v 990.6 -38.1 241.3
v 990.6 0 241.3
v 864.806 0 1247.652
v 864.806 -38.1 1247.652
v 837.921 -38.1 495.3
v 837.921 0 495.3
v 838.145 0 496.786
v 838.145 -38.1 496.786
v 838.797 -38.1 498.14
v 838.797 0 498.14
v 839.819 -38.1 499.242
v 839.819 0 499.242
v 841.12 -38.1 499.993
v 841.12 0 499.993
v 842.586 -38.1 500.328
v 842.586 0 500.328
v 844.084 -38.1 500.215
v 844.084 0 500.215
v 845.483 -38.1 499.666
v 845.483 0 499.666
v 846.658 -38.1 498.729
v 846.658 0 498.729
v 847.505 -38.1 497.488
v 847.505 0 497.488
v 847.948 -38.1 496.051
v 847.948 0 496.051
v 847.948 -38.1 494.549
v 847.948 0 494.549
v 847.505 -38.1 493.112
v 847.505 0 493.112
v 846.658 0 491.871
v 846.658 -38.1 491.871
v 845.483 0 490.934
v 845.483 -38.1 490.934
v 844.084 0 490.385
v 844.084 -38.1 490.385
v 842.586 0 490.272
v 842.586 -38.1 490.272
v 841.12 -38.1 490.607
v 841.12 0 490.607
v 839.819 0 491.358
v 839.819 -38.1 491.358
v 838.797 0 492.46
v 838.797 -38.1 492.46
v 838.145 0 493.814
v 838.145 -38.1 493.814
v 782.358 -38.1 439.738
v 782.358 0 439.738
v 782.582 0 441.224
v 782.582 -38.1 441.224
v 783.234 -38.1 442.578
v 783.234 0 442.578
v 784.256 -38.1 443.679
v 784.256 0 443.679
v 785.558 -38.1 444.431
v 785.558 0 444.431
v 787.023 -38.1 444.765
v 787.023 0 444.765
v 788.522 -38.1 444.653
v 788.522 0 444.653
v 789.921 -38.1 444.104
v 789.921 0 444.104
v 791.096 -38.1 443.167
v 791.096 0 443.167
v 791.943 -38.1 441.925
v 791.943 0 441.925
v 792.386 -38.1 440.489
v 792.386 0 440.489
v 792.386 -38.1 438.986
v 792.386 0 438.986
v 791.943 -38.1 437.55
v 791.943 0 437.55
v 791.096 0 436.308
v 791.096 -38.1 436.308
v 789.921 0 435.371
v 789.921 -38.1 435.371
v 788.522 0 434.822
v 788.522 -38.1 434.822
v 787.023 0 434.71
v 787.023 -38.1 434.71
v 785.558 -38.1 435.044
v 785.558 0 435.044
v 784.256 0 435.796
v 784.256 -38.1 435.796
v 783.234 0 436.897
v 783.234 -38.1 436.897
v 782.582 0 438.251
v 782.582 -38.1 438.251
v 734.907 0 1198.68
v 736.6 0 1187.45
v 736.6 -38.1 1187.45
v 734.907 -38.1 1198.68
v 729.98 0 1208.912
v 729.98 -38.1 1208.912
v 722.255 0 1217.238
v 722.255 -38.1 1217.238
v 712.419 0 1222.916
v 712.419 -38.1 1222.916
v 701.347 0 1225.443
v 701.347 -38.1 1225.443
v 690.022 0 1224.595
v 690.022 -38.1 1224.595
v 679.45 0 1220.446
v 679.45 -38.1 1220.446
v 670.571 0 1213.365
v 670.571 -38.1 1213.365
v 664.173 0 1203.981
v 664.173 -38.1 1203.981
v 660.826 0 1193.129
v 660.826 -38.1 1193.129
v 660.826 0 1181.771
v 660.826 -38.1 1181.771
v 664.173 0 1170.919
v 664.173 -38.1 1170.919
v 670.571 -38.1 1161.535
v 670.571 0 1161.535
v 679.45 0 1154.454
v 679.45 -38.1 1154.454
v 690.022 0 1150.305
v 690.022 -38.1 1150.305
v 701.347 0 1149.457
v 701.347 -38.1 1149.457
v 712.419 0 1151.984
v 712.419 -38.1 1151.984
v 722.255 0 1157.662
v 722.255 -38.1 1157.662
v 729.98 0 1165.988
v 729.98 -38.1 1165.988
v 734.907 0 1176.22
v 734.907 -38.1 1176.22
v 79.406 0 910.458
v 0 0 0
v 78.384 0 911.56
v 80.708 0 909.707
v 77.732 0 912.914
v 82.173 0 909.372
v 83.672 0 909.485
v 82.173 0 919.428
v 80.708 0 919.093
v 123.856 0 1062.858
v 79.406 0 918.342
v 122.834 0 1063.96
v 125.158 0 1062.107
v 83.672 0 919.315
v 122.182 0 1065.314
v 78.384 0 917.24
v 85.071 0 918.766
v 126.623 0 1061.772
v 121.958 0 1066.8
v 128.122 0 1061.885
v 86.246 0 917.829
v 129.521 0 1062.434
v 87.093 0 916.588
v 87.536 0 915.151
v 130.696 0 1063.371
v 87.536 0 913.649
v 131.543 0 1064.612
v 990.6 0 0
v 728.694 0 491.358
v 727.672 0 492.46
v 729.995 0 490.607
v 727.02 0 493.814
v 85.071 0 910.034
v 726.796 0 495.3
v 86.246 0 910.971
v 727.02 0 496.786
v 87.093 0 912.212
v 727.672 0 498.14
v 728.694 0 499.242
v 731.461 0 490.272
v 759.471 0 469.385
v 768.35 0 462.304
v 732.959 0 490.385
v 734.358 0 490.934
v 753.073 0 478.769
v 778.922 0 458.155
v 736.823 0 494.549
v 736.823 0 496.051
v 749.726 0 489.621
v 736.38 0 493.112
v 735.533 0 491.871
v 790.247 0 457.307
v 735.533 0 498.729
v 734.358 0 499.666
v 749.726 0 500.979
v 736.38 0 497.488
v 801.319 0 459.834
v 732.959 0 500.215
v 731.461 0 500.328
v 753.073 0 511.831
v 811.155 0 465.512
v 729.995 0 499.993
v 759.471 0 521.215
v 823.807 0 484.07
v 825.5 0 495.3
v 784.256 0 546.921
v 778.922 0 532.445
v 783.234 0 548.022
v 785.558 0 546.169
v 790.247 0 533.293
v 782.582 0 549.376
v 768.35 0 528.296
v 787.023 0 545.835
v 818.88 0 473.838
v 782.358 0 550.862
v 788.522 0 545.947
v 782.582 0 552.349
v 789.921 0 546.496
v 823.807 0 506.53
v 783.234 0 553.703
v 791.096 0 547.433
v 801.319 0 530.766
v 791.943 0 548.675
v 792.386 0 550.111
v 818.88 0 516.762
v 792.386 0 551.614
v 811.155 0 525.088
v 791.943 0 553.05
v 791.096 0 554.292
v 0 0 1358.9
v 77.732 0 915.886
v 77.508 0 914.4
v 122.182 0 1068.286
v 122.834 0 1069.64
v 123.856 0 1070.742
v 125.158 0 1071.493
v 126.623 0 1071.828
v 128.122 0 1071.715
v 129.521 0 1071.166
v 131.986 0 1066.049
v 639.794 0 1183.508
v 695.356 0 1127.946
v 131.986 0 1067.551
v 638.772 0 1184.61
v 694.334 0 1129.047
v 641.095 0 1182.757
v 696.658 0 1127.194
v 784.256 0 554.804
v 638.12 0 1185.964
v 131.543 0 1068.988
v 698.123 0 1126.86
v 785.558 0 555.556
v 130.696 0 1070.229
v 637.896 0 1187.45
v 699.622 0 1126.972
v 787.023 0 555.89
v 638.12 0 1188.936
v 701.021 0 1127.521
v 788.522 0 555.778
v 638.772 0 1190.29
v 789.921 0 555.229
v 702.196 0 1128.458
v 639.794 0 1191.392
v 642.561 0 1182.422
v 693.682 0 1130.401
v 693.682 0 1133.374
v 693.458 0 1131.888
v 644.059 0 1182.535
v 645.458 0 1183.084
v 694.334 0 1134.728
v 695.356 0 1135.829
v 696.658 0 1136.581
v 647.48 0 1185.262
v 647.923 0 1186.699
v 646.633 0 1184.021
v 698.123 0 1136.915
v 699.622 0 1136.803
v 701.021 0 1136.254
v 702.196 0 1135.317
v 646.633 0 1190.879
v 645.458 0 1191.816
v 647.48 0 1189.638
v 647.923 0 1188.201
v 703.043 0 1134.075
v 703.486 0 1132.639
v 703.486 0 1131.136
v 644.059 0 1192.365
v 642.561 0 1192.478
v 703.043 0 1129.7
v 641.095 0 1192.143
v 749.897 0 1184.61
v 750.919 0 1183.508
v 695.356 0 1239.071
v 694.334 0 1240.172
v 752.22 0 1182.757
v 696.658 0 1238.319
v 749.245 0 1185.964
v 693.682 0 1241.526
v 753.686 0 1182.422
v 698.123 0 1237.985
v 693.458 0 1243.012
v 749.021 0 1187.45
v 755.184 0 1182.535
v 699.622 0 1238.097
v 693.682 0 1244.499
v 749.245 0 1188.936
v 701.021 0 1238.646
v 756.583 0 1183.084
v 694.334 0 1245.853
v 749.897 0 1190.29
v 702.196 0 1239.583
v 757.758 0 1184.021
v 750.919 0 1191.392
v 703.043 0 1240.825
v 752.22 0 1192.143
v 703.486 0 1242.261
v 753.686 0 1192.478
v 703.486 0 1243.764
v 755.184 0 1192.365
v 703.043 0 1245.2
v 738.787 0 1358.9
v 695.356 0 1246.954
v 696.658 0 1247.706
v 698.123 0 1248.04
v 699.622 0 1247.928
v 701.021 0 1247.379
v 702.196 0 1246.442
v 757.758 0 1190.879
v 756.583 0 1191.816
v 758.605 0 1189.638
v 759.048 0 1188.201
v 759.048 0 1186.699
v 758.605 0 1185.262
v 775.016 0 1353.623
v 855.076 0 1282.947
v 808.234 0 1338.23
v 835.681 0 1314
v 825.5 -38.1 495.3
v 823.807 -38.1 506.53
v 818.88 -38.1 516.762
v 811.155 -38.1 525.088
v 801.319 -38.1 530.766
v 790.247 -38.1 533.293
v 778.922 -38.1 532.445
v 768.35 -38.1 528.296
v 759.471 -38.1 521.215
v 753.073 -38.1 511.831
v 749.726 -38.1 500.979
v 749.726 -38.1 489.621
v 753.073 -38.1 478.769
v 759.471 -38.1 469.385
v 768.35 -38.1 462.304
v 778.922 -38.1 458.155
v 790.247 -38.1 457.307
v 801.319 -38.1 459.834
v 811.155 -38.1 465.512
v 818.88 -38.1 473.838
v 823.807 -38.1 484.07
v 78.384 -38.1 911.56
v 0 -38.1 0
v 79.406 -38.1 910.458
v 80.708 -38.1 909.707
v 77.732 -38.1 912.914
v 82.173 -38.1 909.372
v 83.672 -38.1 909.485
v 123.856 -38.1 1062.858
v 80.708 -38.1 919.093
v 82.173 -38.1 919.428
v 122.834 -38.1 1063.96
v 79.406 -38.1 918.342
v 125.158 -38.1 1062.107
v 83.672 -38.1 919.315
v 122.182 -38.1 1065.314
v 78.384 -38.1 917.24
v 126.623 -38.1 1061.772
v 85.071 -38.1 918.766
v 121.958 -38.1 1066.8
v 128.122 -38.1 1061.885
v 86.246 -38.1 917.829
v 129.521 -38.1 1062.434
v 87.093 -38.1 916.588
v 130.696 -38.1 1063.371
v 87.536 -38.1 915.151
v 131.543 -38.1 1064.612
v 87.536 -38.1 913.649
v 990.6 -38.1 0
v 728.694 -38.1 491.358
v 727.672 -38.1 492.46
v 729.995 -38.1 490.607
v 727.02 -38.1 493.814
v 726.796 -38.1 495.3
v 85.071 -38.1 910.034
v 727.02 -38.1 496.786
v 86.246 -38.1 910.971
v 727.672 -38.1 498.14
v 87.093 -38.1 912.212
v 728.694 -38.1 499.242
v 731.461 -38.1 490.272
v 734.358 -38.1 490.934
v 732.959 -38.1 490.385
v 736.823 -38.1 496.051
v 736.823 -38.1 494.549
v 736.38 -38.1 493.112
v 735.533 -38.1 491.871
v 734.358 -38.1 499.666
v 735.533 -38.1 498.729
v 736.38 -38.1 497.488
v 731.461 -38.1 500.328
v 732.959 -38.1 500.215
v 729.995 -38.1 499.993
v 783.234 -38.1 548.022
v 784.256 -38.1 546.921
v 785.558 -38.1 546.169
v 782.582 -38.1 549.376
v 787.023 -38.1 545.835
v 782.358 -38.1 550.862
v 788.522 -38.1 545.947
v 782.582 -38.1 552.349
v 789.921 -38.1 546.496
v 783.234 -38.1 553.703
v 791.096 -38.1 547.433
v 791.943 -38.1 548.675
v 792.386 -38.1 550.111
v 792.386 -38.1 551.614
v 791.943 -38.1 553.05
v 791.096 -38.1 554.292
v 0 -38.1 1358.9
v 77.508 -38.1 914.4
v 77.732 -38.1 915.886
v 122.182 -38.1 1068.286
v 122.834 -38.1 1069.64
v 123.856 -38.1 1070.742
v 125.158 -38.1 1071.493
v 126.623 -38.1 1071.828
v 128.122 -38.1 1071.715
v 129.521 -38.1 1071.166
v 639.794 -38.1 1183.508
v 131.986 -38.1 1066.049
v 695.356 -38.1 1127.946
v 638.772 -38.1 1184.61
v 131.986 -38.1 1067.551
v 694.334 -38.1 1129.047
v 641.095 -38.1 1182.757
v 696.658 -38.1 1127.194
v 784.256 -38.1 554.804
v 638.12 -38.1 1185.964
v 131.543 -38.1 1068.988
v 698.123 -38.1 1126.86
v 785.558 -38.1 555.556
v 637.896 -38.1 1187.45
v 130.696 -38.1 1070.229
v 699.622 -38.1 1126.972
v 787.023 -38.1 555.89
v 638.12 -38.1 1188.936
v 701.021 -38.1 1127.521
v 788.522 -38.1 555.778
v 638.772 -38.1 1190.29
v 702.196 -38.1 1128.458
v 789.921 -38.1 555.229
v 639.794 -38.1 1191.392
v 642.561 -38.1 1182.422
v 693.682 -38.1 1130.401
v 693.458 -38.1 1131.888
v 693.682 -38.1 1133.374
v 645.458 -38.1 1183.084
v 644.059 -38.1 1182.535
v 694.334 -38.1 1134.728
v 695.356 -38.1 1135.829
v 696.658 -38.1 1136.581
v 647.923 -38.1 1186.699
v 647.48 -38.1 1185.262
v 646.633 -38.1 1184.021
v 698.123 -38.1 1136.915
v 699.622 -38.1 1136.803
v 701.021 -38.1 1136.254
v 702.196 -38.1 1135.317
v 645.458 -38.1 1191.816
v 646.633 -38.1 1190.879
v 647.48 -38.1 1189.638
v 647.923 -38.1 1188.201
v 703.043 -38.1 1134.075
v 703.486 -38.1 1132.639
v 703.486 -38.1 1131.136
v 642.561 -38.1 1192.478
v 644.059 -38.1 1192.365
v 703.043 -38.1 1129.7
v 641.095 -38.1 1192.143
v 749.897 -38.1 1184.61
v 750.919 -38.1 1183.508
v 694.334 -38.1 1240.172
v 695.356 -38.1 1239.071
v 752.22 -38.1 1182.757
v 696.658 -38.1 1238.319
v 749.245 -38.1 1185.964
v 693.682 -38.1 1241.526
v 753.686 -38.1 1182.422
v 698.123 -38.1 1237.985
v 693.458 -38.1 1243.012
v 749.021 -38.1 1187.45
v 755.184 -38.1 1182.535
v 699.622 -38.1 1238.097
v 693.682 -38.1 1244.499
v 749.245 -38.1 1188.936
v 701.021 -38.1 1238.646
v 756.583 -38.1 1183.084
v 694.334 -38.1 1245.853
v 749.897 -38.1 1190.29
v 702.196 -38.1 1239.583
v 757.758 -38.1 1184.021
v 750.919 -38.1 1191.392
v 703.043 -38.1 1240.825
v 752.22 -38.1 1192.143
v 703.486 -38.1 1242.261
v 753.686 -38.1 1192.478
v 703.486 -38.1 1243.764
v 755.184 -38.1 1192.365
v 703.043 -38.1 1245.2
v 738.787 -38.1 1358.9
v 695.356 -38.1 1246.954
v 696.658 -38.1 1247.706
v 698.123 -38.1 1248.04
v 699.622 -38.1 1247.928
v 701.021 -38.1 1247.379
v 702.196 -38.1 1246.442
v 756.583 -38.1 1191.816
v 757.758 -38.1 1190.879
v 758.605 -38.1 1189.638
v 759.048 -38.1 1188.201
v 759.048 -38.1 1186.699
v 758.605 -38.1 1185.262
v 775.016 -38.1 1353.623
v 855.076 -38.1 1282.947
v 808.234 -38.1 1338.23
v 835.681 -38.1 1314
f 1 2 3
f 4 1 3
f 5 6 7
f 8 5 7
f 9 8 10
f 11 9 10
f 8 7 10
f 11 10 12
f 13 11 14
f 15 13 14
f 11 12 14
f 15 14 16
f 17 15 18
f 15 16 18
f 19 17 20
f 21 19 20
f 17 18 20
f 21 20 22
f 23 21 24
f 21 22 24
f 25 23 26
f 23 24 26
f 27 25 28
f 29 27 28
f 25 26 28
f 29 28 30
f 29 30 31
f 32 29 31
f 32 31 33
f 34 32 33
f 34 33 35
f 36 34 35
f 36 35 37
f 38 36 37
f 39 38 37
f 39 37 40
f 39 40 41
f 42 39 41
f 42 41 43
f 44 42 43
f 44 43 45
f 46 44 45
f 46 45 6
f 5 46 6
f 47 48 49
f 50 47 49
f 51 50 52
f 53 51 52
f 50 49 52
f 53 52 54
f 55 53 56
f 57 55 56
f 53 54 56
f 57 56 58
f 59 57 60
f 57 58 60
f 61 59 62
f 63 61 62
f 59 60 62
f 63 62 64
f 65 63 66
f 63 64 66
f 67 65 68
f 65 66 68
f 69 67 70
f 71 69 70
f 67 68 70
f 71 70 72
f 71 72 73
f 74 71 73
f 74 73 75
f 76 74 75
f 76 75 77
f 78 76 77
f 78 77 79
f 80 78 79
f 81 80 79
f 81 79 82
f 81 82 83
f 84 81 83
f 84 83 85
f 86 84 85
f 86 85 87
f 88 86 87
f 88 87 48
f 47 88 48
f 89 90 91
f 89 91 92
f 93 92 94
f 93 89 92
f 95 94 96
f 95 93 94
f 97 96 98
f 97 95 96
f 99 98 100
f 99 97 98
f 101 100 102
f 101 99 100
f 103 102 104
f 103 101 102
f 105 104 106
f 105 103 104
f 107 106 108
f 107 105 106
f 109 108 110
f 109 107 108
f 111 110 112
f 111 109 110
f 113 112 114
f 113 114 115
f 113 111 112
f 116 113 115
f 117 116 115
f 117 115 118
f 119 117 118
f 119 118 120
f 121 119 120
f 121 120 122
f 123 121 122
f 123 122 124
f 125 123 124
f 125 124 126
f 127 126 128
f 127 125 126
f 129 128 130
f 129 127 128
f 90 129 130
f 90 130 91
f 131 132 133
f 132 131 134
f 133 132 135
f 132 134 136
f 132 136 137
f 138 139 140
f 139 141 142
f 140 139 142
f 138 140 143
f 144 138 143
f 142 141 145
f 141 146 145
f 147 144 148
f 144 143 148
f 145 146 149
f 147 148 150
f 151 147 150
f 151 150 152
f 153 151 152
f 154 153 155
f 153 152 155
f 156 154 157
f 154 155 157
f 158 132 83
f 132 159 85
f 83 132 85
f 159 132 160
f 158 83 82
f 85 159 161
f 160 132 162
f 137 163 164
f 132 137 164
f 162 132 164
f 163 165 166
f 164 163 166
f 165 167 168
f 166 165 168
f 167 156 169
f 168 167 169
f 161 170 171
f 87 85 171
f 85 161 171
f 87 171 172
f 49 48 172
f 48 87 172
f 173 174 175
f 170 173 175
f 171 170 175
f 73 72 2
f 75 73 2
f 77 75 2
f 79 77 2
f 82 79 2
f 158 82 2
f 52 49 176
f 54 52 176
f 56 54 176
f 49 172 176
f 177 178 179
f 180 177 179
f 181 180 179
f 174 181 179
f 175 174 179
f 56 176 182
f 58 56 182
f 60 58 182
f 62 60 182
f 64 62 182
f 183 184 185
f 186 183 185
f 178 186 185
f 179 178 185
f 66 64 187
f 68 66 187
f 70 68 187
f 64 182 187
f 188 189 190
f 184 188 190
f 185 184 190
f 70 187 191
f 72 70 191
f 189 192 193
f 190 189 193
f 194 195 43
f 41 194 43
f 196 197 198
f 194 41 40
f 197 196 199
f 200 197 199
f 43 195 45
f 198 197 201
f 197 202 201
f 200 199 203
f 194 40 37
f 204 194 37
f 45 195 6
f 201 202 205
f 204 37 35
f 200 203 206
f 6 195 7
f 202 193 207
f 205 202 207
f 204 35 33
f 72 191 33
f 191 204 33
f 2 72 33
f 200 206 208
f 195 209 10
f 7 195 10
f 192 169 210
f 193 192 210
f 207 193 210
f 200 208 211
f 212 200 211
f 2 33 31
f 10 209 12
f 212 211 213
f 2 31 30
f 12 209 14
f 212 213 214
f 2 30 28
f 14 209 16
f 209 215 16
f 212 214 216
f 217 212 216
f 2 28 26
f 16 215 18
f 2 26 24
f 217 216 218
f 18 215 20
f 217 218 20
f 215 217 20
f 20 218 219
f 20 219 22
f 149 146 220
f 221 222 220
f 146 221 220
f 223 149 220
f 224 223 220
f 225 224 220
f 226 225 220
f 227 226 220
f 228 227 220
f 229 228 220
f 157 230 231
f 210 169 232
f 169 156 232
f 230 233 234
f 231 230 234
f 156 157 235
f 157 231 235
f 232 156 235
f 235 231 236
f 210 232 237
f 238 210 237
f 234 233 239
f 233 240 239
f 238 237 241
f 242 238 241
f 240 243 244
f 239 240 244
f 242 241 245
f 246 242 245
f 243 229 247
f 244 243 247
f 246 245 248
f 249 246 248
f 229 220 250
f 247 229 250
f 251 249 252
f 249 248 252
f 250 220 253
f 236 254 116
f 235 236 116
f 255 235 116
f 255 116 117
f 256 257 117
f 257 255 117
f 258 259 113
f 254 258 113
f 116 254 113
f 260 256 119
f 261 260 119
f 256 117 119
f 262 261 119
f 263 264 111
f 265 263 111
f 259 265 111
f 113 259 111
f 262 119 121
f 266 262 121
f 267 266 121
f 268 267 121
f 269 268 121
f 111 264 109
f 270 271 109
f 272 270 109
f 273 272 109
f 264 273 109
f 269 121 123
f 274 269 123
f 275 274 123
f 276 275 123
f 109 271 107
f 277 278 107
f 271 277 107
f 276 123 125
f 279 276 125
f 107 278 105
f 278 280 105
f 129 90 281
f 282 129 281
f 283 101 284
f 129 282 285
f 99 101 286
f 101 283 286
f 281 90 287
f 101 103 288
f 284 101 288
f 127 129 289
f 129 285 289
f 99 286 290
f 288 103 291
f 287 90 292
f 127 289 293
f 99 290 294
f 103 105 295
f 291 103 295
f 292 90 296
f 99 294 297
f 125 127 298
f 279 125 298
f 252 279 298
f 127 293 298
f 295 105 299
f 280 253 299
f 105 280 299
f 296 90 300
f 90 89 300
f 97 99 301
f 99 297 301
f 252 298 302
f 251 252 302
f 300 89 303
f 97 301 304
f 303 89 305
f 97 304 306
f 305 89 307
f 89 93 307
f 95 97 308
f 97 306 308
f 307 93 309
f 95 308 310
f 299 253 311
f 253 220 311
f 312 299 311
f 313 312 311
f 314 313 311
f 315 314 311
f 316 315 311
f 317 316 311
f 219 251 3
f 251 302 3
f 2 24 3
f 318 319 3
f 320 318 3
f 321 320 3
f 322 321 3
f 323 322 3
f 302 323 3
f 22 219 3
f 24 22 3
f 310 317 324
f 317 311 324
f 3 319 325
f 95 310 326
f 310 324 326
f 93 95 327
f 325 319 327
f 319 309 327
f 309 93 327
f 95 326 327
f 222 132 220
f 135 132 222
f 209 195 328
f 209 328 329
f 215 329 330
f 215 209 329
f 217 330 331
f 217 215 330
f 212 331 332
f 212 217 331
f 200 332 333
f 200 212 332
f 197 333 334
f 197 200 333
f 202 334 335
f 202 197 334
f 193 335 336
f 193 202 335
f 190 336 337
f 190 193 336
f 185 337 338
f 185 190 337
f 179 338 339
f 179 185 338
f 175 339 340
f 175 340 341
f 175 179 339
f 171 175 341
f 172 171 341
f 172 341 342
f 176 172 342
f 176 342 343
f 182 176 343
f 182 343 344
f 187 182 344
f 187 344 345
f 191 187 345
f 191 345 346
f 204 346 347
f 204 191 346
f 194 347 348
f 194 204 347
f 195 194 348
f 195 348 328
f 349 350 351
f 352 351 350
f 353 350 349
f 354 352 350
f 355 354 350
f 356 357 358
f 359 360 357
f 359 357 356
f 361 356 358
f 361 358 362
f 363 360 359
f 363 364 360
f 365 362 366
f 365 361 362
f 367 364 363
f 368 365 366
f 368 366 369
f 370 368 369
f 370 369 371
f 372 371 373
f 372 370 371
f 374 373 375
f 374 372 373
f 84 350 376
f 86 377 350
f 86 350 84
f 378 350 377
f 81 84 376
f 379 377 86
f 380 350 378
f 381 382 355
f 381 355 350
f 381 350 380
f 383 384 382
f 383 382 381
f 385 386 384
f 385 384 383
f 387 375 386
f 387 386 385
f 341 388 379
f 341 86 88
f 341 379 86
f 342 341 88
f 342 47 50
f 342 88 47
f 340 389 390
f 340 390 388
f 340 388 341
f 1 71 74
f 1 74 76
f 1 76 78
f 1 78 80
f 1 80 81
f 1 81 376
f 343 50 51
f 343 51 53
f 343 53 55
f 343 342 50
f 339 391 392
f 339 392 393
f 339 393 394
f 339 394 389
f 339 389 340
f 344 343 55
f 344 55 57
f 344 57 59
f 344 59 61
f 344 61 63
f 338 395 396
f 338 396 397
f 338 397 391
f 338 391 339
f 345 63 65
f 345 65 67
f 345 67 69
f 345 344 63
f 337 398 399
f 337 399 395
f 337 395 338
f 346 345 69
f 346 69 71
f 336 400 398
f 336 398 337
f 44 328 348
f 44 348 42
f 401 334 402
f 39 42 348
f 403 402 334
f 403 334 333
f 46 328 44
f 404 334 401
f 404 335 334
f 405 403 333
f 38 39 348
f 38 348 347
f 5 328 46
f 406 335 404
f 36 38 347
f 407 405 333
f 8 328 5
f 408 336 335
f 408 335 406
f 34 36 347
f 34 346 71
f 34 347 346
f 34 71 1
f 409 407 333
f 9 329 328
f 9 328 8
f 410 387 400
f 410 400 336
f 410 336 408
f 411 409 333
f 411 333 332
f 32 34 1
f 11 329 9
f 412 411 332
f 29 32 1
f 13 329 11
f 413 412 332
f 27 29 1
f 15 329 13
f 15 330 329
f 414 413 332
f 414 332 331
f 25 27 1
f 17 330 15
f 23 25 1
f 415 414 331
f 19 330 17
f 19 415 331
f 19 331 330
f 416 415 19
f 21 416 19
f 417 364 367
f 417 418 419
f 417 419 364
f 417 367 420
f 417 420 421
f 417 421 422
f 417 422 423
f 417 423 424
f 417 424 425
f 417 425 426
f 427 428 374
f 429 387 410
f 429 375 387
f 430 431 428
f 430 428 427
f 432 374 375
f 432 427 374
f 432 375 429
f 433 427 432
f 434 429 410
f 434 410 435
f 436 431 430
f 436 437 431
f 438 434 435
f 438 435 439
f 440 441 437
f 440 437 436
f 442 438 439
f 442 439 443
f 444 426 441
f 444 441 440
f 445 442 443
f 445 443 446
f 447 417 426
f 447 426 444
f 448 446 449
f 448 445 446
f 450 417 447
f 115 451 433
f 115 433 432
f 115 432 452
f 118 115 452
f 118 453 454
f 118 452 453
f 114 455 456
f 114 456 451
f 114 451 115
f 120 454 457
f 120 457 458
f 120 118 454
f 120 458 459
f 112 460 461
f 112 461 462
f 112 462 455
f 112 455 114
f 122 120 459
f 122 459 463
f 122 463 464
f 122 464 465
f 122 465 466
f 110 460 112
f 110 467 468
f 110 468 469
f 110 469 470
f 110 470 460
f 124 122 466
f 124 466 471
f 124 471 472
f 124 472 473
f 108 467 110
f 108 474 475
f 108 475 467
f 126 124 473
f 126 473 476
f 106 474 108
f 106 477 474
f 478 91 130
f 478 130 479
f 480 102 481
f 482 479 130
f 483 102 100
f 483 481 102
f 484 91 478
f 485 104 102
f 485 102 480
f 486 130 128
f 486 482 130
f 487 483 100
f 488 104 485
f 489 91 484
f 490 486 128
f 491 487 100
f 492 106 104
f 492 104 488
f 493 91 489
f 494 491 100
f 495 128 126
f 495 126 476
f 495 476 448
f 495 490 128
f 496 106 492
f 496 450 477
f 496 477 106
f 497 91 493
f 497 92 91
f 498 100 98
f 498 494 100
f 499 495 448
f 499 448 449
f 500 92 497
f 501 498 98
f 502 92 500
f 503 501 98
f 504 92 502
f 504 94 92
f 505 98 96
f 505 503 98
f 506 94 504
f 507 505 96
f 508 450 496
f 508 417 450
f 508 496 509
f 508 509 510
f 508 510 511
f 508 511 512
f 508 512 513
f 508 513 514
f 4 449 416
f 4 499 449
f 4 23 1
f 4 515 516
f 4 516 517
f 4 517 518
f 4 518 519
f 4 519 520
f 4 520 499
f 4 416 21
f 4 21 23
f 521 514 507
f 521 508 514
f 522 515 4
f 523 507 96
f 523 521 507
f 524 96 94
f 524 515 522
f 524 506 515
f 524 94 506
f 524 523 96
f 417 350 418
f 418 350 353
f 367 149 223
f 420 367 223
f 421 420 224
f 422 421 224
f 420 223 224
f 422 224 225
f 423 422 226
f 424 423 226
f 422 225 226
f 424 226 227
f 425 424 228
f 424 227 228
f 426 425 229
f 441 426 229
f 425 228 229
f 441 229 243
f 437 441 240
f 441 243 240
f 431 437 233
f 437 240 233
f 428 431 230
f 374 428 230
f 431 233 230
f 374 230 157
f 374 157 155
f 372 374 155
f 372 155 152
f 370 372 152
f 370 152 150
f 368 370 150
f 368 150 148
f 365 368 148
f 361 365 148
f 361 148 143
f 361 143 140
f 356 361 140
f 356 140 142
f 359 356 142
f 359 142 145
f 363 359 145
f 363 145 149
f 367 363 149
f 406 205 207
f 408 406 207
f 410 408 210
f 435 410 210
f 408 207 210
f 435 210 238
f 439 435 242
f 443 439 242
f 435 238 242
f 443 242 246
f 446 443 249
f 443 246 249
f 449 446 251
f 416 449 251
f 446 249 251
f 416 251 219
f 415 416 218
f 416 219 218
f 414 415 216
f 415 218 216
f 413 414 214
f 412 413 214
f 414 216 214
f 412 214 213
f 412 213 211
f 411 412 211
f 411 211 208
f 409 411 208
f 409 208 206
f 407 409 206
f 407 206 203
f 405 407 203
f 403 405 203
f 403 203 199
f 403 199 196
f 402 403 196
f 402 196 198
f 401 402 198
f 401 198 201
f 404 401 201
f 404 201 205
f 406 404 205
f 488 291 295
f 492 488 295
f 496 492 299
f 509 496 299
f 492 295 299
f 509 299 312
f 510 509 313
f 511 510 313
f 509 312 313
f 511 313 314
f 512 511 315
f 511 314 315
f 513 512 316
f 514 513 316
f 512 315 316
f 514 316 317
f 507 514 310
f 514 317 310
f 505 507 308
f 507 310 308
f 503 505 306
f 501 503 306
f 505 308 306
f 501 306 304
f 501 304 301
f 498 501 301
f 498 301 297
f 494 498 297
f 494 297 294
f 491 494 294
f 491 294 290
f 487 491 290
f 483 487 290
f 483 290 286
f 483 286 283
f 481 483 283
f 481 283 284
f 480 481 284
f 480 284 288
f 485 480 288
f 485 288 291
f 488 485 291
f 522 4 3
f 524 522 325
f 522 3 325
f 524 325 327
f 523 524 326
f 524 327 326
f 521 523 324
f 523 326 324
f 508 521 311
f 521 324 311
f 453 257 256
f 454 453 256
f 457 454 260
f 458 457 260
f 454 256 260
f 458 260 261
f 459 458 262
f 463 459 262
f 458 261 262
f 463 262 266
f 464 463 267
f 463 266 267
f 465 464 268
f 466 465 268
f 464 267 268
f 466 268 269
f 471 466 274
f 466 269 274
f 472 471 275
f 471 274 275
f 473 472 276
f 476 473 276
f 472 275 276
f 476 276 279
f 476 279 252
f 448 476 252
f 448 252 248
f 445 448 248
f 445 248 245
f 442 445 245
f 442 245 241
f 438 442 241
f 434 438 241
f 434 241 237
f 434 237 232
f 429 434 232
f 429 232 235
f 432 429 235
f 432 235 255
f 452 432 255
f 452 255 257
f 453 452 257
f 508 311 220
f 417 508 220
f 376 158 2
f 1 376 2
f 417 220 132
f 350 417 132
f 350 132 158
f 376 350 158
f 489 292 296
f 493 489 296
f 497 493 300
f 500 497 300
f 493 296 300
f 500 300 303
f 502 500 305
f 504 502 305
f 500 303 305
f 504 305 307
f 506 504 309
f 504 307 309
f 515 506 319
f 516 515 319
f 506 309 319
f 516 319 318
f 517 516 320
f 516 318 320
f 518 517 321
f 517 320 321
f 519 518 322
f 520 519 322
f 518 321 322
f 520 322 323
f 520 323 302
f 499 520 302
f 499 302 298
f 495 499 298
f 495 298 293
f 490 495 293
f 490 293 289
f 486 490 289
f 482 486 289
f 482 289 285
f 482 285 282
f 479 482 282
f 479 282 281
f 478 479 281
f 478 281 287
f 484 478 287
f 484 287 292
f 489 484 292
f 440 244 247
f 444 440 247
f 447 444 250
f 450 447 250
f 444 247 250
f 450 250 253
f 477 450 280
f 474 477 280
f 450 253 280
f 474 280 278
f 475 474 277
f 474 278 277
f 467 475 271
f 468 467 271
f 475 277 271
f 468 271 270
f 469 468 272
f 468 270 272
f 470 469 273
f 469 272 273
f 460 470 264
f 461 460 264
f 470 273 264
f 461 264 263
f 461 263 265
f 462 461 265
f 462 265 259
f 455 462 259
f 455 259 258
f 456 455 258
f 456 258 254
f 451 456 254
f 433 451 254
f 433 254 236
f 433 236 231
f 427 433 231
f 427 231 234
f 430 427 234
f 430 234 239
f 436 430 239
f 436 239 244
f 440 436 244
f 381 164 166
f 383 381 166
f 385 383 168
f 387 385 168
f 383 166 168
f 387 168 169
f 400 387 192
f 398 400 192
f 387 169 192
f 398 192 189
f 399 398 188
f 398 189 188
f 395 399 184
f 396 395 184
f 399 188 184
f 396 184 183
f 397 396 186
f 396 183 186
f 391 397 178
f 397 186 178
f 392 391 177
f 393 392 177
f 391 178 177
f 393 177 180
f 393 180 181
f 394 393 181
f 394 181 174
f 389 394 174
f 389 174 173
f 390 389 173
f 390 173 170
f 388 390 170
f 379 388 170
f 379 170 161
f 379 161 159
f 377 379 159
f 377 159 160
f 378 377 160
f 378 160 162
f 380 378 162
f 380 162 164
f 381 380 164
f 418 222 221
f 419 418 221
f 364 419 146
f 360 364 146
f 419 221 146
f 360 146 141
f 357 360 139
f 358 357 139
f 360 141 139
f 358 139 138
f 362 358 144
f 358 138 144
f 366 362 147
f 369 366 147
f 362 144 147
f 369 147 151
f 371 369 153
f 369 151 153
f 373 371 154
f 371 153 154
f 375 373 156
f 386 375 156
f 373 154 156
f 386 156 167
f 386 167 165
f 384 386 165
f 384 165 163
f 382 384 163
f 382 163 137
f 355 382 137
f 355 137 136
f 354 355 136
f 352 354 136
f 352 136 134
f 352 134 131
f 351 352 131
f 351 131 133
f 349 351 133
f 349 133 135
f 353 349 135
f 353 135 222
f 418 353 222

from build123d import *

# Parameters (mm, degrees)
F0_R     = 38.1
F1_DEPTH = 38.1
F3_D     = 10.0838


# Not quite as in the source:
# - a feature names something its author has since deleted; it is built from what else it names


with BuildPart() as f1:
    # F0 (on Front) → F1 (new body)
    with BuildSketch(Plane.XZ):
        with BuildLine():
            Line((0, 1358.9), (0, 0))
            Line((0, 0), (990.6, 0))
            Line((990.6, 0), (990.6, 241.3))
            Line((990.6, 241.3), (864.8059485884, 1247.6524112928))
            ThreePointArc((864.8059485884, 1247.6524112928), (822.8355837767, 1327.1091283286), (738.7866582458, 1358.9))
            Line((738.7866582458, 1358.9), (0, 1358.9))
        make_face()
        with Locations((787.4, 495.3)):
            Circle(F0_R, mode=Mode.SUBTRACT)
        with Locations((698.5, 1187.45)):
            Circle(F0_R, mode=Mode.SUBTRACT)
    extrude(amount=F1_DEPTH)

    # F3 (through all)
    with Locations(Plane.XZ.offset(38.1)):
        with Locations((82.55, 914.4), (127, 1066.8), (698.5, 1243.0125), (754.0625, 1187.45), (698.5, 1131.8875), (642.9375, 1187.45), (842.9625, 495.3), (787.4, 550.8625), (731.8375, 495.3), (787.4, 439.7375)):
            Hole(F3_D / 2)


solid = f1.part
